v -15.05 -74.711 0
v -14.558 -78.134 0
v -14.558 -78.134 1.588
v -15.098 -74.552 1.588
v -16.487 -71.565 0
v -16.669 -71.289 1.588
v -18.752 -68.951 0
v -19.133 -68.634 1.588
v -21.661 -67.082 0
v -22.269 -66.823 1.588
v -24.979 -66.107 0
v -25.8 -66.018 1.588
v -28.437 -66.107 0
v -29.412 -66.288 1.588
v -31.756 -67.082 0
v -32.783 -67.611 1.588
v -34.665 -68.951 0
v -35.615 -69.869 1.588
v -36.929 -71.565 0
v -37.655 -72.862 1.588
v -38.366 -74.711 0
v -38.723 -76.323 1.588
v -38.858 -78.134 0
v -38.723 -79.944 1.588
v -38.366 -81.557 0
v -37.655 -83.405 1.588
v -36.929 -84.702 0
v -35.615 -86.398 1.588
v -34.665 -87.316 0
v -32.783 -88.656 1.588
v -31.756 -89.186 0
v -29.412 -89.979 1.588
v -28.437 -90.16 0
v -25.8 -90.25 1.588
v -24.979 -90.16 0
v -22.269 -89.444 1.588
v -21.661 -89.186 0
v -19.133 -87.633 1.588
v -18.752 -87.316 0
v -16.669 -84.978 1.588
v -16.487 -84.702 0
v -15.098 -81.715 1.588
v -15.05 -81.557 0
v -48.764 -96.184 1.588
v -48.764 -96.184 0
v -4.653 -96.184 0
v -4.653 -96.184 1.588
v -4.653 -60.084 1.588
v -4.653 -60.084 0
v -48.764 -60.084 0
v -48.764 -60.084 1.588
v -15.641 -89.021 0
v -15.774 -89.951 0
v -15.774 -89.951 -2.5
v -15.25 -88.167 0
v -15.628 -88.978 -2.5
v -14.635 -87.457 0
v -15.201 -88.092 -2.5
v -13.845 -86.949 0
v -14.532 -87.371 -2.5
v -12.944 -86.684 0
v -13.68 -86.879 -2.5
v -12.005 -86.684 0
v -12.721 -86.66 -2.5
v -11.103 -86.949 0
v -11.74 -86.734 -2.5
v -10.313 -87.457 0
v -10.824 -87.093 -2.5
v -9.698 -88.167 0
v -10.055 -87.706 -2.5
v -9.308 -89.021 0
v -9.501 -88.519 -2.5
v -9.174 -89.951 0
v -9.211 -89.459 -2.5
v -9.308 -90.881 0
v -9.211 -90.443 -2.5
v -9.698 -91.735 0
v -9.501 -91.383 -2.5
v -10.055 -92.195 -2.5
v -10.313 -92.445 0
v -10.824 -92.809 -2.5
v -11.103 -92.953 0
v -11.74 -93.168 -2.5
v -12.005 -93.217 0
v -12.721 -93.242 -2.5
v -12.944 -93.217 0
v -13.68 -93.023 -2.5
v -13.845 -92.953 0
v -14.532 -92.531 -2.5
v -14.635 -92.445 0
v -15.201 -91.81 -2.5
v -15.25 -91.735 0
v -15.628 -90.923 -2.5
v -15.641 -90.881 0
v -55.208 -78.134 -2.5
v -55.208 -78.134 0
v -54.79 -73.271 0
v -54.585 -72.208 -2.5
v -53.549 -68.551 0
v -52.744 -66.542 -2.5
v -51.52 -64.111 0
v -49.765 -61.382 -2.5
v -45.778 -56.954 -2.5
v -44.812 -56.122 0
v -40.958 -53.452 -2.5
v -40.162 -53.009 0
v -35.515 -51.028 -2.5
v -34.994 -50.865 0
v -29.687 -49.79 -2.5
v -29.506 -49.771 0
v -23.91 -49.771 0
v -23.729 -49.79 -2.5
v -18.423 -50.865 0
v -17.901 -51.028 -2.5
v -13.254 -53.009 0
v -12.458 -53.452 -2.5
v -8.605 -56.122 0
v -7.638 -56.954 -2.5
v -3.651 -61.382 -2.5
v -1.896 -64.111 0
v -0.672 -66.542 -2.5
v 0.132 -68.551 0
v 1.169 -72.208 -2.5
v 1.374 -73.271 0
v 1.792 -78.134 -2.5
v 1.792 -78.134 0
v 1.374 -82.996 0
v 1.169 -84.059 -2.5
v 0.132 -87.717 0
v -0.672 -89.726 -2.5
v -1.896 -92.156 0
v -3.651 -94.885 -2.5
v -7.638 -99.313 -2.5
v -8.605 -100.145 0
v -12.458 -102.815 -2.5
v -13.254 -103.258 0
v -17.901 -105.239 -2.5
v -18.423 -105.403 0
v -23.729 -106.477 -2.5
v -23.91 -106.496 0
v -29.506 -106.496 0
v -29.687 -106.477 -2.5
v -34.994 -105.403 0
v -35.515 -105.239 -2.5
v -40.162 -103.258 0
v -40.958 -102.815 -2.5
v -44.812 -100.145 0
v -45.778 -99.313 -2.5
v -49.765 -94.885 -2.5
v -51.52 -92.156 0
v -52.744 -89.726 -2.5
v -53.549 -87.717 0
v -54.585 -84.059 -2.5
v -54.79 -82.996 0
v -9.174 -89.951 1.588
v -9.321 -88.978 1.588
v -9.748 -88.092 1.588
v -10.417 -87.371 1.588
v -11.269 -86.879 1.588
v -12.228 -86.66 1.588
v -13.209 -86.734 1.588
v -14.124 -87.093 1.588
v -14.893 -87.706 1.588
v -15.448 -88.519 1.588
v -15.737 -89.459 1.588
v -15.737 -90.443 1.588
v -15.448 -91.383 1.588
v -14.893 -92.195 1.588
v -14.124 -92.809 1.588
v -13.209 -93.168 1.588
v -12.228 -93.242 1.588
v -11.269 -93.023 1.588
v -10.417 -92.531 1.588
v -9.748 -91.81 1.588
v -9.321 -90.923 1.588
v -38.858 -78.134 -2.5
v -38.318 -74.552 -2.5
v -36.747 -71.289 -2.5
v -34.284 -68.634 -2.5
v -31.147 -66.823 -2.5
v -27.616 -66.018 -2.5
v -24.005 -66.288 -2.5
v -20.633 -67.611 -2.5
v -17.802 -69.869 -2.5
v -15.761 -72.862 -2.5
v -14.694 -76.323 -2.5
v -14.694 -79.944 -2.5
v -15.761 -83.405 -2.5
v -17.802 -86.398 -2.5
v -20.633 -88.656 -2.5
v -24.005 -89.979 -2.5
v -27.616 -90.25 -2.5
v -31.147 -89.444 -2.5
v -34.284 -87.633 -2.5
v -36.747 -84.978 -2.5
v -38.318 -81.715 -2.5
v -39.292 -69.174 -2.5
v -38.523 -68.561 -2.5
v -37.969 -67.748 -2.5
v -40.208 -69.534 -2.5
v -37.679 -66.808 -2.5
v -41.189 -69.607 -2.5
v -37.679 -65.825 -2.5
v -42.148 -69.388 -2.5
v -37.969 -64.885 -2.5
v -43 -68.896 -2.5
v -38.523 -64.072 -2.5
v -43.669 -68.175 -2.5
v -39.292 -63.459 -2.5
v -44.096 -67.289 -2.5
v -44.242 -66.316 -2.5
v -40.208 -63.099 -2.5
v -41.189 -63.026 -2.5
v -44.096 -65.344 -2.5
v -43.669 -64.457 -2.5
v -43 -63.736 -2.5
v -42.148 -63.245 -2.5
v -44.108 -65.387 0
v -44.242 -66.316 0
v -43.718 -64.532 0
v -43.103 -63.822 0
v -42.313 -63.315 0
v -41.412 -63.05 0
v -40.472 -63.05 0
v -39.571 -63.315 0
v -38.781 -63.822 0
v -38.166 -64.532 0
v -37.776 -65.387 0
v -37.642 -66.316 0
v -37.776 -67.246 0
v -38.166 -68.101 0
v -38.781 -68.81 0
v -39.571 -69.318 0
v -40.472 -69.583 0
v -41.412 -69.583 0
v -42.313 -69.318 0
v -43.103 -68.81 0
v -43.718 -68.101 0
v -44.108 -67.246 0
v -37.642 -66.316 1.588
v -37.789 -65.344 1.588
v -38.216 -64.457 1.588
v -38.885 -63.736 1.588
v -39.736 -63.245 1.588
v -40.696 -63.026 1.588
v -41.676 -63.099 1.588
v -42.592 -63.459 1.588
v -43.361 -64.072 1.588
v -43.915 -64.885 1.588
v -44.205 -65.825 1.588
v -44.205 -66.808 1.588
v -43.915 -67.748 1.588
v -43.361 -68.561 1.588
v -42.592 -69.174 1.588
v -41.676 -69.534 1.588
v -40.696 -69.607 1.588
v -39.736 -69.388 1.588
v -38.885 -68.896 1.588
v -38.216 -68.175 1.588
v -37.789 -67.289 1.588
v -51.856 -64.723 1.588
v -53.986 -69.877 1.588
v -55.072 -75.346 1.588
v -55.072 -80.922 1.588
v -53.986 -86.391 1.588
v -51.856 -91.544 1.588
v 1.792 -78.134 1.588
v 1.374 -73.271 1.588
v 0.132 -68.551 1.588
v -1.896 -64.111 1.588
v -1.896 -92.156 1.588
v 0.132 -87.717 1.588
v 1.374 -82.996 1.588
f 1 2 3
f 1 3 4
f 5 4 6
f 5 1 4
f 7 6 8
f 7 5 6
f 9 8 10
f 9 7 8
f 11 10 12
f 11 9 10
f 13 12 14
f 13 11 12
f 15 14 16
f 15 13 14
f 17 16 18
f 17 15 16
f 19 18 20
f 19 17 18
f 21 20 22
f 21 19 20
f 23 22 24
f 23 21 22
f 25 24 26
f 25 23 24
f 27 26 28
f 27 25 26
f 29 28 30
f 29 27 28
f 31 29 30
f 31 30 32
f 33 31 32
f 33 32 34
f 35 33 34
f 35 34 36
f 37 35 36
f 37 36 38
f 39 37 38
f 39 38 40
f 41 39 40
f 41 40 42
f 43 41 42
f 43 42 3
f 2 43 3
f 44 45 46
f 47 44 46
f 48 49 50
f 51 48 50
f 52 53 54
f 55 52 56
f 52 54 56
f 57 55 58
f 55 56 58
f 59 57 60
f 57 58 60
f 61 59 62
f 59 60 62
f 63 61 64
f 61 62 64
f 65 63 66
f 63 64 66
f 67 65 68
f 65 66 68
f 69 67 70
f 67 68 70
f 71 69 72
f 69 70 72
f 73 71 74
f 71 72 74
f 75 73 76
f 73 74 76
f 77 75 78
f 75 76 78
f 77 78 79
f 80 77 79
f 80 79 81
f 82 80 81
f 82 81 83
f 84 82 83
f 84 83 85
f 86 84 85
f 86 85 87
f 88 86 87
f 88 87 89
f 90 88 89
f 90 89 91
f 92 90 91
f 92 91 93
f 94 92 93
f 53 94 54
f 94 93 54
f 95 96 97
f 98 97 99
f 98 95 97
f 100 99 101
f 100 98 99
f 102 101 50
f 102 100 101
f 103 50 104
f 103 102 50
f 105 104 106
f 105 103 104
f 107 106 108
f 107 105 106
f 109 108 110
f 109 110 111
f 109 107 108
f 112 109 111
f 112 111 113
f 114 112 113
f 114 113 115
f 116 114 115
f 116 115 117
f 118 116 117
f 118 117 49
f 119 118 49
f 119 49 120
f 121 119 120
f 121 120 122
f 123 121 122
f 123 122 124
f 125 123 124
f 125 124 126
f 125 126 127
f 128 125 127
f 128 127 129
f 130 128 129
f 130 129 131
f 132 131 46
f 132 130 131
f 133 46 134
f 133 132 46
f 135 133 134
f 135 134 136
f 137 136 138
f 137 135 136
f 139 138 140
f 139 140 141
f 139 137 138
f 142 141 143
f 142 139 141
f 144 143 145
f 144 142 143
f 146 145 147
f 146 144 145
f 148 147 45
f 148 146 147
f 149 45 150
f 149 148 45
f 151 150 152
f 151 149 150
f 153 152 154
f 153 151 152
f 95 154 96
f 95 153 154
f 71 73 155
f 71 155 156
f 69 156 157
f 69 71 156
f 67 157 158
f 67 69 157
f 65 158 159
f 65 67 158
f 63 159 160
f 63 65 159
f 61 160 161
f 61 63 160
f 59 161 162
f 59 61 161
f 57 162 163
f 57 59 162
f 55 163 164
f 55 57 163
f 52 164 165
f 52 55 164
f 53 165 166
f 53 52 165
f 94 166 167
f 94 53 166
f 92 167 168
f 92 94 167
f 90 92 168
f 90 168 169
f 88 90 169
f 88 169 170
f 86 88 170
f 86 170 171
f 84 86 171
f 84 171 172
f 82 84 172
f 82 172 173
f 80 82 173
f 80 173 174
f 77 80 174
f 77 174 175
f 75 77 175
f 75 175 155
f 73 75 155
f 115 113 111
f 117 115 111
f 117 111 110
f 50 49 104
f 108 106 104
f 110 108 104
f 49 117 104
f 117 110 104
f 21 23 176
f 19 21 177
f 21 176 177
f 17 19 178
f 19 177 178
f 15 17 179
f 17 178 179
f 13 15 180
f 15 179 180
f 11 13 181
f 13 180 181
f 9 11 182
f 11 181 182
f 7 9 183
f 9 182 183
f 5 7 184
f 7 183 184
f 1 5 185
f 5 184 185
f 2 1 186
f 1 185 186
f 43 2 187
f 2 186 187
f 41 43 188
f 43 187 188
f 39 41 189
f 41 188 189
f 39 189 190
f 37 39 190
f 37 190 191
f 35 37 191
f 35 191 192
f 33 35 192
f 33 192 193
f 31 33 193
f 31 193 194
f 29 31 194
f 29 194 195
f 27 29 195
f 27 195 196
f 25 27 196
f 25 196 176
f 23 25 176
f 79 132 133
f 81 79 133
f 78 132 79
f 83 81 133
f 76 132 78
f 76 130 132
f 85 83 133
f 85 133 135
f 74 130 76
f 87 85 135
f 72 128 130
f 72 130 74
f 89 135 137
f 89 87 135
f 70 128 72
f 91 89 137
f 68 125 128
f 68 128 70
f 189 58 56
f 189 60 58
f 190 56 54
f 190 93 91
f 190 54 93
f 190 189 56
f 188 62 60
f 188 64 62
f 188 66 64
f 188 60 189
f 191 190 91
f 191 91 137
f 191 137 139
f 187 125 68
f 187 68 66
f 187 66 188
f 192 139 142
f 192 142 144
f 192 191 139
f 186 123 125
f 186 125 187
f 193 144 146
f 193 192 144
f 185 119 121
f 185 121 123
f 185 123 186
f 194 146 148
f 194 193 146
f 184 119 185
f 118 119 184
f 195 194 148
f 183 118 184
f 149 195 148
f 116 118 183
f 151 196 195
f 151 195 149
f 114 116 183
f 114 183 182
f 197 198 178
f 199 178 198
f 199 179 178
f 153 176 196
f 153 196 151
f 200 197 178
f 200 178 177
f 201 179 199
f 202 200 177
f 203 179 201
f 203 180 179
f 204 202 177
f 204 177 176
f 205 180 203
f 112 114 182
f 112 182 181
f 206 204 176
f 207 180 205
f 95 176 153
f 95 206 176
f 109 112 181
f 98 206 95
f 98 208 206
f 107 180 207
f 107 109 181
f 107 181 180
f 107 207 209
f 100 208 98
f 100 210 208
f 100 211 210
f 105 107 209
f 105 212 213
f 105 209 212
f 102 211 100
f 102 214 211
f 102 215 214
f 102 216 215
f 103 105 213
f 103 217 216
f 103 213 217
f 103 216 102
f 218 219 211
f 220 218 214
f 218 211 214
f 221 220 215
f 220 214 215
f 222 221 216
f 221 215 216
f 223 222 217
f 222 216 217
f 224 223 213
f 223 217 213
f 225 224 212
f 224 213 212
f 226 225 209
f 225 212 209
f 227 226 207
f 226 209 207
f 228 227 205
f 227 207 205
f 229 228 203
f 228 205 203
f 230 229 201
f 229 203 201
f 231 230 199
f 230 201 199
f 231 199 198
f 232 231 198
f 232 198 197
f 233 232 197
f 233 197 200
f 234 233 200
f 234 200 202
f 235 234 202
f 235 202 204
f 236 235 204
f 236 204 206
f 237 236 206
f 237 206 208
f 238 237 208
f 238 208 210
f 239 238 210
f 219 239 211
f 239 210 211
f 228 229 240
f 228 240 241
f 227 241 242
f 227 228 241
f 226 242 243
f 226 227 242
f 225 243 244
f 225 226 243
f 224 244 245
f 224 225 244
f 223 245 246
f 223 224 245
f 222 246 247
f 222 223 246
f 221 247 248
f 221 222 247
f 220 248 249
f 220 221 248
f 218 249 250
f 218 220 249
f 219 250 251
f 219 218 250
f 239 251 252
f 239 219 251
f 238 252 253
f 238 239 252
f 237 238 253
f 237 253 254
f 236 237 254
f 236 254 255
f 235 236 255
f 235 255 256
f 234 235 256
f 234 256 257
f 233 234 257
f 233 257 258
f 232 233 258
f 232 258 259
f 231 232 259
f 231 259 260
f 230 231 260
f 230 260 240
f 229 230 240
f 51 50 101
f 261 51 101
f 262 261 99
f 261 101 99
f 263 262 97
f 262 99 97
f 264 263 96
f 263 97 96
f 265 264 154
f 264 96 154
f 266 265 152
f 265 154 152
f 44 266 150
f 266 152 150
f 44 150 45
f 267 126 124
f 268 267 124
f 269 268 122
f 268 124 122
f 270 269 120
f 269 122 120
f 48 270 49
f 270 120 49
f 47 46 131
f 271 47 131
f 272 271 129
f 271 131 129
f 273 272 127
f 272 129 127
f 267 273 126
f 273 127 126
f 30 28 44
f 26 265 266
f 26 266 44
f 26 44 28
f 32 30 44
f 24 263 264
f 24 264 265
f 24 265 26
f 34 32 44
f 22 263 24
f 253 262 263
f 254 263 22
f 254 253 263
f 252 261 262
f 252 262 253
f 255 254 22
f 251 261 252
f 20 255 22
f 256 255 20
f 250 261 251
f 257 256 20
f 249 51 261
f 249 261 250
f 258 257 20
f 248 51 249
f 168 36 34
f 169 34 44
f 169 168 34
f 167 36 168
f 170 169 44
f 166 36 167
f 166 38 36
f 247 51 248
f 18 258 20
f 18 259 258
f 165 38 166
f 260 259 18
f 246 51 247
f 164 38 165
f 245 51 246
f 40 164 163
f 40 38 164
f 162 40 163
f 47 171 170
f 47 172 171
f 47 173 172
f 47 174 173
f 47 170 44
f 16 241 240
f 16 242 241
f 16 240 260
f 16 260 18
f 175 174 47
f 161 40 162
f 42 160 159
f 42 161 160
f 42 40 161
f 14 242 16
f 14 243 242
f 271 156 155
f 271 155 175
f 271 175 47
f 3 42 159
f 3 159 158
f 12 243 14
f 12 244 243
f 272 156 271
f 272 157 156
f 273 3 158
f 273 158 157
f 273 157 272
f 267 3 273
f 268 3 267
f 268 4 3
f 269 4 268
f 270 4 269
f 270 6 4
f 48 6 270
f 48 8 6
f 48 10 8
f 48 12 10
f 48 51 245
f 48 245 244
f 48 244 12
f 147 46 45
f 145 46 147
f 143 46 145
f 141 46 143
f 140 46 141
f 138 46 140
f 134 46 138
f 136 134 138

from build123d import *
from build123d.topology import SkipClean

# Parameters (mm, degrees)
SKETCH1_R           = 3.3
SKETCH1_R_2         = 12.15
BOSS_EXTRUDE1_DEPTH = 1.5875
BOSS_EXTRUDE2_START = 2.5
SKETCH2_R           = 28.5
SKETCH2_R_2         = 3.3
SKETCH2_R_3         = 12.15
BOSS_EXTRUDE2_DEPTH = 2.5


with BuildPart() as part:
    # Sketch1 → Boss-Extrude1 (new body)
    with BuildSketch(Plane.XY):
        with BuildLine():
            Line((-4.652672523, -60.083596209), (-48.763782235, -60.083596209))
            ThreePointArc((-48.763782235, -60.083596209), (-55.208227379, -78.133596209), (-48.763782235, -96.183596209))
            Line((-48.763782235, -96.183596209), (-4.652672523, -96.183596209))
            ThreePointArc((-4.652672523, -96.183596209), (0.132351167, -87.716567737), (1.791772621, -78.133596209))
            ThreePointArc((1.791772621, -78.133596209), (0.132351167, -68.550624681), (-4.652672523, -60.083596209))
        make_face()
        with Locations((-12.47433561, -89.950800833)):
            Circle(SKETCH1_R, mode=Mode.SUBTRACT)
        with Locations((-26.708227379, -78.133596209)):
            Circle(SKETCH1_R_2, mode=Mode.SUBTRACT)
        with Locations((-40.942119147, -66.316391585)):
            Circle(SKETCH1_R, mode=Mode.SUBTRACT)
    extrude(amount=BOSS_EXTRUDE1_DEPTH)

    # Sketch2 → Boss-Extrude2 (add)
    with SkipClean():  # the faces are left unmerged after this step: merging them gives an invalid solid
        with BuildSketch(Plane(origin=(0, 0, 0), x_dir=(-1, 0, 0), z_dir=(0, 0, -1)).offset(BOSS_EXTRUDE2_START)):
            with Locations((26.708227379, -78.133596209)):
                Circle(SKETCH2_R)
            with Locations((40.942119147, -66.316391585)):
                Circle(SKETCH2_R_2, mode=Mode.SUBTRACT)
            with Locations((12.47433561, -89.950800833)):
                Circle(SKETCH2_R_2, mode=Mode.SUBTRACT)
            with Locations((26.708227379, -78.133596209)):
                Circle(SKETCH2_R_3, mode=Mode.SUBTRACT)
        extrude(amount=-BOSS_EXTRUDE2_DEPTH)


solid = part.part
